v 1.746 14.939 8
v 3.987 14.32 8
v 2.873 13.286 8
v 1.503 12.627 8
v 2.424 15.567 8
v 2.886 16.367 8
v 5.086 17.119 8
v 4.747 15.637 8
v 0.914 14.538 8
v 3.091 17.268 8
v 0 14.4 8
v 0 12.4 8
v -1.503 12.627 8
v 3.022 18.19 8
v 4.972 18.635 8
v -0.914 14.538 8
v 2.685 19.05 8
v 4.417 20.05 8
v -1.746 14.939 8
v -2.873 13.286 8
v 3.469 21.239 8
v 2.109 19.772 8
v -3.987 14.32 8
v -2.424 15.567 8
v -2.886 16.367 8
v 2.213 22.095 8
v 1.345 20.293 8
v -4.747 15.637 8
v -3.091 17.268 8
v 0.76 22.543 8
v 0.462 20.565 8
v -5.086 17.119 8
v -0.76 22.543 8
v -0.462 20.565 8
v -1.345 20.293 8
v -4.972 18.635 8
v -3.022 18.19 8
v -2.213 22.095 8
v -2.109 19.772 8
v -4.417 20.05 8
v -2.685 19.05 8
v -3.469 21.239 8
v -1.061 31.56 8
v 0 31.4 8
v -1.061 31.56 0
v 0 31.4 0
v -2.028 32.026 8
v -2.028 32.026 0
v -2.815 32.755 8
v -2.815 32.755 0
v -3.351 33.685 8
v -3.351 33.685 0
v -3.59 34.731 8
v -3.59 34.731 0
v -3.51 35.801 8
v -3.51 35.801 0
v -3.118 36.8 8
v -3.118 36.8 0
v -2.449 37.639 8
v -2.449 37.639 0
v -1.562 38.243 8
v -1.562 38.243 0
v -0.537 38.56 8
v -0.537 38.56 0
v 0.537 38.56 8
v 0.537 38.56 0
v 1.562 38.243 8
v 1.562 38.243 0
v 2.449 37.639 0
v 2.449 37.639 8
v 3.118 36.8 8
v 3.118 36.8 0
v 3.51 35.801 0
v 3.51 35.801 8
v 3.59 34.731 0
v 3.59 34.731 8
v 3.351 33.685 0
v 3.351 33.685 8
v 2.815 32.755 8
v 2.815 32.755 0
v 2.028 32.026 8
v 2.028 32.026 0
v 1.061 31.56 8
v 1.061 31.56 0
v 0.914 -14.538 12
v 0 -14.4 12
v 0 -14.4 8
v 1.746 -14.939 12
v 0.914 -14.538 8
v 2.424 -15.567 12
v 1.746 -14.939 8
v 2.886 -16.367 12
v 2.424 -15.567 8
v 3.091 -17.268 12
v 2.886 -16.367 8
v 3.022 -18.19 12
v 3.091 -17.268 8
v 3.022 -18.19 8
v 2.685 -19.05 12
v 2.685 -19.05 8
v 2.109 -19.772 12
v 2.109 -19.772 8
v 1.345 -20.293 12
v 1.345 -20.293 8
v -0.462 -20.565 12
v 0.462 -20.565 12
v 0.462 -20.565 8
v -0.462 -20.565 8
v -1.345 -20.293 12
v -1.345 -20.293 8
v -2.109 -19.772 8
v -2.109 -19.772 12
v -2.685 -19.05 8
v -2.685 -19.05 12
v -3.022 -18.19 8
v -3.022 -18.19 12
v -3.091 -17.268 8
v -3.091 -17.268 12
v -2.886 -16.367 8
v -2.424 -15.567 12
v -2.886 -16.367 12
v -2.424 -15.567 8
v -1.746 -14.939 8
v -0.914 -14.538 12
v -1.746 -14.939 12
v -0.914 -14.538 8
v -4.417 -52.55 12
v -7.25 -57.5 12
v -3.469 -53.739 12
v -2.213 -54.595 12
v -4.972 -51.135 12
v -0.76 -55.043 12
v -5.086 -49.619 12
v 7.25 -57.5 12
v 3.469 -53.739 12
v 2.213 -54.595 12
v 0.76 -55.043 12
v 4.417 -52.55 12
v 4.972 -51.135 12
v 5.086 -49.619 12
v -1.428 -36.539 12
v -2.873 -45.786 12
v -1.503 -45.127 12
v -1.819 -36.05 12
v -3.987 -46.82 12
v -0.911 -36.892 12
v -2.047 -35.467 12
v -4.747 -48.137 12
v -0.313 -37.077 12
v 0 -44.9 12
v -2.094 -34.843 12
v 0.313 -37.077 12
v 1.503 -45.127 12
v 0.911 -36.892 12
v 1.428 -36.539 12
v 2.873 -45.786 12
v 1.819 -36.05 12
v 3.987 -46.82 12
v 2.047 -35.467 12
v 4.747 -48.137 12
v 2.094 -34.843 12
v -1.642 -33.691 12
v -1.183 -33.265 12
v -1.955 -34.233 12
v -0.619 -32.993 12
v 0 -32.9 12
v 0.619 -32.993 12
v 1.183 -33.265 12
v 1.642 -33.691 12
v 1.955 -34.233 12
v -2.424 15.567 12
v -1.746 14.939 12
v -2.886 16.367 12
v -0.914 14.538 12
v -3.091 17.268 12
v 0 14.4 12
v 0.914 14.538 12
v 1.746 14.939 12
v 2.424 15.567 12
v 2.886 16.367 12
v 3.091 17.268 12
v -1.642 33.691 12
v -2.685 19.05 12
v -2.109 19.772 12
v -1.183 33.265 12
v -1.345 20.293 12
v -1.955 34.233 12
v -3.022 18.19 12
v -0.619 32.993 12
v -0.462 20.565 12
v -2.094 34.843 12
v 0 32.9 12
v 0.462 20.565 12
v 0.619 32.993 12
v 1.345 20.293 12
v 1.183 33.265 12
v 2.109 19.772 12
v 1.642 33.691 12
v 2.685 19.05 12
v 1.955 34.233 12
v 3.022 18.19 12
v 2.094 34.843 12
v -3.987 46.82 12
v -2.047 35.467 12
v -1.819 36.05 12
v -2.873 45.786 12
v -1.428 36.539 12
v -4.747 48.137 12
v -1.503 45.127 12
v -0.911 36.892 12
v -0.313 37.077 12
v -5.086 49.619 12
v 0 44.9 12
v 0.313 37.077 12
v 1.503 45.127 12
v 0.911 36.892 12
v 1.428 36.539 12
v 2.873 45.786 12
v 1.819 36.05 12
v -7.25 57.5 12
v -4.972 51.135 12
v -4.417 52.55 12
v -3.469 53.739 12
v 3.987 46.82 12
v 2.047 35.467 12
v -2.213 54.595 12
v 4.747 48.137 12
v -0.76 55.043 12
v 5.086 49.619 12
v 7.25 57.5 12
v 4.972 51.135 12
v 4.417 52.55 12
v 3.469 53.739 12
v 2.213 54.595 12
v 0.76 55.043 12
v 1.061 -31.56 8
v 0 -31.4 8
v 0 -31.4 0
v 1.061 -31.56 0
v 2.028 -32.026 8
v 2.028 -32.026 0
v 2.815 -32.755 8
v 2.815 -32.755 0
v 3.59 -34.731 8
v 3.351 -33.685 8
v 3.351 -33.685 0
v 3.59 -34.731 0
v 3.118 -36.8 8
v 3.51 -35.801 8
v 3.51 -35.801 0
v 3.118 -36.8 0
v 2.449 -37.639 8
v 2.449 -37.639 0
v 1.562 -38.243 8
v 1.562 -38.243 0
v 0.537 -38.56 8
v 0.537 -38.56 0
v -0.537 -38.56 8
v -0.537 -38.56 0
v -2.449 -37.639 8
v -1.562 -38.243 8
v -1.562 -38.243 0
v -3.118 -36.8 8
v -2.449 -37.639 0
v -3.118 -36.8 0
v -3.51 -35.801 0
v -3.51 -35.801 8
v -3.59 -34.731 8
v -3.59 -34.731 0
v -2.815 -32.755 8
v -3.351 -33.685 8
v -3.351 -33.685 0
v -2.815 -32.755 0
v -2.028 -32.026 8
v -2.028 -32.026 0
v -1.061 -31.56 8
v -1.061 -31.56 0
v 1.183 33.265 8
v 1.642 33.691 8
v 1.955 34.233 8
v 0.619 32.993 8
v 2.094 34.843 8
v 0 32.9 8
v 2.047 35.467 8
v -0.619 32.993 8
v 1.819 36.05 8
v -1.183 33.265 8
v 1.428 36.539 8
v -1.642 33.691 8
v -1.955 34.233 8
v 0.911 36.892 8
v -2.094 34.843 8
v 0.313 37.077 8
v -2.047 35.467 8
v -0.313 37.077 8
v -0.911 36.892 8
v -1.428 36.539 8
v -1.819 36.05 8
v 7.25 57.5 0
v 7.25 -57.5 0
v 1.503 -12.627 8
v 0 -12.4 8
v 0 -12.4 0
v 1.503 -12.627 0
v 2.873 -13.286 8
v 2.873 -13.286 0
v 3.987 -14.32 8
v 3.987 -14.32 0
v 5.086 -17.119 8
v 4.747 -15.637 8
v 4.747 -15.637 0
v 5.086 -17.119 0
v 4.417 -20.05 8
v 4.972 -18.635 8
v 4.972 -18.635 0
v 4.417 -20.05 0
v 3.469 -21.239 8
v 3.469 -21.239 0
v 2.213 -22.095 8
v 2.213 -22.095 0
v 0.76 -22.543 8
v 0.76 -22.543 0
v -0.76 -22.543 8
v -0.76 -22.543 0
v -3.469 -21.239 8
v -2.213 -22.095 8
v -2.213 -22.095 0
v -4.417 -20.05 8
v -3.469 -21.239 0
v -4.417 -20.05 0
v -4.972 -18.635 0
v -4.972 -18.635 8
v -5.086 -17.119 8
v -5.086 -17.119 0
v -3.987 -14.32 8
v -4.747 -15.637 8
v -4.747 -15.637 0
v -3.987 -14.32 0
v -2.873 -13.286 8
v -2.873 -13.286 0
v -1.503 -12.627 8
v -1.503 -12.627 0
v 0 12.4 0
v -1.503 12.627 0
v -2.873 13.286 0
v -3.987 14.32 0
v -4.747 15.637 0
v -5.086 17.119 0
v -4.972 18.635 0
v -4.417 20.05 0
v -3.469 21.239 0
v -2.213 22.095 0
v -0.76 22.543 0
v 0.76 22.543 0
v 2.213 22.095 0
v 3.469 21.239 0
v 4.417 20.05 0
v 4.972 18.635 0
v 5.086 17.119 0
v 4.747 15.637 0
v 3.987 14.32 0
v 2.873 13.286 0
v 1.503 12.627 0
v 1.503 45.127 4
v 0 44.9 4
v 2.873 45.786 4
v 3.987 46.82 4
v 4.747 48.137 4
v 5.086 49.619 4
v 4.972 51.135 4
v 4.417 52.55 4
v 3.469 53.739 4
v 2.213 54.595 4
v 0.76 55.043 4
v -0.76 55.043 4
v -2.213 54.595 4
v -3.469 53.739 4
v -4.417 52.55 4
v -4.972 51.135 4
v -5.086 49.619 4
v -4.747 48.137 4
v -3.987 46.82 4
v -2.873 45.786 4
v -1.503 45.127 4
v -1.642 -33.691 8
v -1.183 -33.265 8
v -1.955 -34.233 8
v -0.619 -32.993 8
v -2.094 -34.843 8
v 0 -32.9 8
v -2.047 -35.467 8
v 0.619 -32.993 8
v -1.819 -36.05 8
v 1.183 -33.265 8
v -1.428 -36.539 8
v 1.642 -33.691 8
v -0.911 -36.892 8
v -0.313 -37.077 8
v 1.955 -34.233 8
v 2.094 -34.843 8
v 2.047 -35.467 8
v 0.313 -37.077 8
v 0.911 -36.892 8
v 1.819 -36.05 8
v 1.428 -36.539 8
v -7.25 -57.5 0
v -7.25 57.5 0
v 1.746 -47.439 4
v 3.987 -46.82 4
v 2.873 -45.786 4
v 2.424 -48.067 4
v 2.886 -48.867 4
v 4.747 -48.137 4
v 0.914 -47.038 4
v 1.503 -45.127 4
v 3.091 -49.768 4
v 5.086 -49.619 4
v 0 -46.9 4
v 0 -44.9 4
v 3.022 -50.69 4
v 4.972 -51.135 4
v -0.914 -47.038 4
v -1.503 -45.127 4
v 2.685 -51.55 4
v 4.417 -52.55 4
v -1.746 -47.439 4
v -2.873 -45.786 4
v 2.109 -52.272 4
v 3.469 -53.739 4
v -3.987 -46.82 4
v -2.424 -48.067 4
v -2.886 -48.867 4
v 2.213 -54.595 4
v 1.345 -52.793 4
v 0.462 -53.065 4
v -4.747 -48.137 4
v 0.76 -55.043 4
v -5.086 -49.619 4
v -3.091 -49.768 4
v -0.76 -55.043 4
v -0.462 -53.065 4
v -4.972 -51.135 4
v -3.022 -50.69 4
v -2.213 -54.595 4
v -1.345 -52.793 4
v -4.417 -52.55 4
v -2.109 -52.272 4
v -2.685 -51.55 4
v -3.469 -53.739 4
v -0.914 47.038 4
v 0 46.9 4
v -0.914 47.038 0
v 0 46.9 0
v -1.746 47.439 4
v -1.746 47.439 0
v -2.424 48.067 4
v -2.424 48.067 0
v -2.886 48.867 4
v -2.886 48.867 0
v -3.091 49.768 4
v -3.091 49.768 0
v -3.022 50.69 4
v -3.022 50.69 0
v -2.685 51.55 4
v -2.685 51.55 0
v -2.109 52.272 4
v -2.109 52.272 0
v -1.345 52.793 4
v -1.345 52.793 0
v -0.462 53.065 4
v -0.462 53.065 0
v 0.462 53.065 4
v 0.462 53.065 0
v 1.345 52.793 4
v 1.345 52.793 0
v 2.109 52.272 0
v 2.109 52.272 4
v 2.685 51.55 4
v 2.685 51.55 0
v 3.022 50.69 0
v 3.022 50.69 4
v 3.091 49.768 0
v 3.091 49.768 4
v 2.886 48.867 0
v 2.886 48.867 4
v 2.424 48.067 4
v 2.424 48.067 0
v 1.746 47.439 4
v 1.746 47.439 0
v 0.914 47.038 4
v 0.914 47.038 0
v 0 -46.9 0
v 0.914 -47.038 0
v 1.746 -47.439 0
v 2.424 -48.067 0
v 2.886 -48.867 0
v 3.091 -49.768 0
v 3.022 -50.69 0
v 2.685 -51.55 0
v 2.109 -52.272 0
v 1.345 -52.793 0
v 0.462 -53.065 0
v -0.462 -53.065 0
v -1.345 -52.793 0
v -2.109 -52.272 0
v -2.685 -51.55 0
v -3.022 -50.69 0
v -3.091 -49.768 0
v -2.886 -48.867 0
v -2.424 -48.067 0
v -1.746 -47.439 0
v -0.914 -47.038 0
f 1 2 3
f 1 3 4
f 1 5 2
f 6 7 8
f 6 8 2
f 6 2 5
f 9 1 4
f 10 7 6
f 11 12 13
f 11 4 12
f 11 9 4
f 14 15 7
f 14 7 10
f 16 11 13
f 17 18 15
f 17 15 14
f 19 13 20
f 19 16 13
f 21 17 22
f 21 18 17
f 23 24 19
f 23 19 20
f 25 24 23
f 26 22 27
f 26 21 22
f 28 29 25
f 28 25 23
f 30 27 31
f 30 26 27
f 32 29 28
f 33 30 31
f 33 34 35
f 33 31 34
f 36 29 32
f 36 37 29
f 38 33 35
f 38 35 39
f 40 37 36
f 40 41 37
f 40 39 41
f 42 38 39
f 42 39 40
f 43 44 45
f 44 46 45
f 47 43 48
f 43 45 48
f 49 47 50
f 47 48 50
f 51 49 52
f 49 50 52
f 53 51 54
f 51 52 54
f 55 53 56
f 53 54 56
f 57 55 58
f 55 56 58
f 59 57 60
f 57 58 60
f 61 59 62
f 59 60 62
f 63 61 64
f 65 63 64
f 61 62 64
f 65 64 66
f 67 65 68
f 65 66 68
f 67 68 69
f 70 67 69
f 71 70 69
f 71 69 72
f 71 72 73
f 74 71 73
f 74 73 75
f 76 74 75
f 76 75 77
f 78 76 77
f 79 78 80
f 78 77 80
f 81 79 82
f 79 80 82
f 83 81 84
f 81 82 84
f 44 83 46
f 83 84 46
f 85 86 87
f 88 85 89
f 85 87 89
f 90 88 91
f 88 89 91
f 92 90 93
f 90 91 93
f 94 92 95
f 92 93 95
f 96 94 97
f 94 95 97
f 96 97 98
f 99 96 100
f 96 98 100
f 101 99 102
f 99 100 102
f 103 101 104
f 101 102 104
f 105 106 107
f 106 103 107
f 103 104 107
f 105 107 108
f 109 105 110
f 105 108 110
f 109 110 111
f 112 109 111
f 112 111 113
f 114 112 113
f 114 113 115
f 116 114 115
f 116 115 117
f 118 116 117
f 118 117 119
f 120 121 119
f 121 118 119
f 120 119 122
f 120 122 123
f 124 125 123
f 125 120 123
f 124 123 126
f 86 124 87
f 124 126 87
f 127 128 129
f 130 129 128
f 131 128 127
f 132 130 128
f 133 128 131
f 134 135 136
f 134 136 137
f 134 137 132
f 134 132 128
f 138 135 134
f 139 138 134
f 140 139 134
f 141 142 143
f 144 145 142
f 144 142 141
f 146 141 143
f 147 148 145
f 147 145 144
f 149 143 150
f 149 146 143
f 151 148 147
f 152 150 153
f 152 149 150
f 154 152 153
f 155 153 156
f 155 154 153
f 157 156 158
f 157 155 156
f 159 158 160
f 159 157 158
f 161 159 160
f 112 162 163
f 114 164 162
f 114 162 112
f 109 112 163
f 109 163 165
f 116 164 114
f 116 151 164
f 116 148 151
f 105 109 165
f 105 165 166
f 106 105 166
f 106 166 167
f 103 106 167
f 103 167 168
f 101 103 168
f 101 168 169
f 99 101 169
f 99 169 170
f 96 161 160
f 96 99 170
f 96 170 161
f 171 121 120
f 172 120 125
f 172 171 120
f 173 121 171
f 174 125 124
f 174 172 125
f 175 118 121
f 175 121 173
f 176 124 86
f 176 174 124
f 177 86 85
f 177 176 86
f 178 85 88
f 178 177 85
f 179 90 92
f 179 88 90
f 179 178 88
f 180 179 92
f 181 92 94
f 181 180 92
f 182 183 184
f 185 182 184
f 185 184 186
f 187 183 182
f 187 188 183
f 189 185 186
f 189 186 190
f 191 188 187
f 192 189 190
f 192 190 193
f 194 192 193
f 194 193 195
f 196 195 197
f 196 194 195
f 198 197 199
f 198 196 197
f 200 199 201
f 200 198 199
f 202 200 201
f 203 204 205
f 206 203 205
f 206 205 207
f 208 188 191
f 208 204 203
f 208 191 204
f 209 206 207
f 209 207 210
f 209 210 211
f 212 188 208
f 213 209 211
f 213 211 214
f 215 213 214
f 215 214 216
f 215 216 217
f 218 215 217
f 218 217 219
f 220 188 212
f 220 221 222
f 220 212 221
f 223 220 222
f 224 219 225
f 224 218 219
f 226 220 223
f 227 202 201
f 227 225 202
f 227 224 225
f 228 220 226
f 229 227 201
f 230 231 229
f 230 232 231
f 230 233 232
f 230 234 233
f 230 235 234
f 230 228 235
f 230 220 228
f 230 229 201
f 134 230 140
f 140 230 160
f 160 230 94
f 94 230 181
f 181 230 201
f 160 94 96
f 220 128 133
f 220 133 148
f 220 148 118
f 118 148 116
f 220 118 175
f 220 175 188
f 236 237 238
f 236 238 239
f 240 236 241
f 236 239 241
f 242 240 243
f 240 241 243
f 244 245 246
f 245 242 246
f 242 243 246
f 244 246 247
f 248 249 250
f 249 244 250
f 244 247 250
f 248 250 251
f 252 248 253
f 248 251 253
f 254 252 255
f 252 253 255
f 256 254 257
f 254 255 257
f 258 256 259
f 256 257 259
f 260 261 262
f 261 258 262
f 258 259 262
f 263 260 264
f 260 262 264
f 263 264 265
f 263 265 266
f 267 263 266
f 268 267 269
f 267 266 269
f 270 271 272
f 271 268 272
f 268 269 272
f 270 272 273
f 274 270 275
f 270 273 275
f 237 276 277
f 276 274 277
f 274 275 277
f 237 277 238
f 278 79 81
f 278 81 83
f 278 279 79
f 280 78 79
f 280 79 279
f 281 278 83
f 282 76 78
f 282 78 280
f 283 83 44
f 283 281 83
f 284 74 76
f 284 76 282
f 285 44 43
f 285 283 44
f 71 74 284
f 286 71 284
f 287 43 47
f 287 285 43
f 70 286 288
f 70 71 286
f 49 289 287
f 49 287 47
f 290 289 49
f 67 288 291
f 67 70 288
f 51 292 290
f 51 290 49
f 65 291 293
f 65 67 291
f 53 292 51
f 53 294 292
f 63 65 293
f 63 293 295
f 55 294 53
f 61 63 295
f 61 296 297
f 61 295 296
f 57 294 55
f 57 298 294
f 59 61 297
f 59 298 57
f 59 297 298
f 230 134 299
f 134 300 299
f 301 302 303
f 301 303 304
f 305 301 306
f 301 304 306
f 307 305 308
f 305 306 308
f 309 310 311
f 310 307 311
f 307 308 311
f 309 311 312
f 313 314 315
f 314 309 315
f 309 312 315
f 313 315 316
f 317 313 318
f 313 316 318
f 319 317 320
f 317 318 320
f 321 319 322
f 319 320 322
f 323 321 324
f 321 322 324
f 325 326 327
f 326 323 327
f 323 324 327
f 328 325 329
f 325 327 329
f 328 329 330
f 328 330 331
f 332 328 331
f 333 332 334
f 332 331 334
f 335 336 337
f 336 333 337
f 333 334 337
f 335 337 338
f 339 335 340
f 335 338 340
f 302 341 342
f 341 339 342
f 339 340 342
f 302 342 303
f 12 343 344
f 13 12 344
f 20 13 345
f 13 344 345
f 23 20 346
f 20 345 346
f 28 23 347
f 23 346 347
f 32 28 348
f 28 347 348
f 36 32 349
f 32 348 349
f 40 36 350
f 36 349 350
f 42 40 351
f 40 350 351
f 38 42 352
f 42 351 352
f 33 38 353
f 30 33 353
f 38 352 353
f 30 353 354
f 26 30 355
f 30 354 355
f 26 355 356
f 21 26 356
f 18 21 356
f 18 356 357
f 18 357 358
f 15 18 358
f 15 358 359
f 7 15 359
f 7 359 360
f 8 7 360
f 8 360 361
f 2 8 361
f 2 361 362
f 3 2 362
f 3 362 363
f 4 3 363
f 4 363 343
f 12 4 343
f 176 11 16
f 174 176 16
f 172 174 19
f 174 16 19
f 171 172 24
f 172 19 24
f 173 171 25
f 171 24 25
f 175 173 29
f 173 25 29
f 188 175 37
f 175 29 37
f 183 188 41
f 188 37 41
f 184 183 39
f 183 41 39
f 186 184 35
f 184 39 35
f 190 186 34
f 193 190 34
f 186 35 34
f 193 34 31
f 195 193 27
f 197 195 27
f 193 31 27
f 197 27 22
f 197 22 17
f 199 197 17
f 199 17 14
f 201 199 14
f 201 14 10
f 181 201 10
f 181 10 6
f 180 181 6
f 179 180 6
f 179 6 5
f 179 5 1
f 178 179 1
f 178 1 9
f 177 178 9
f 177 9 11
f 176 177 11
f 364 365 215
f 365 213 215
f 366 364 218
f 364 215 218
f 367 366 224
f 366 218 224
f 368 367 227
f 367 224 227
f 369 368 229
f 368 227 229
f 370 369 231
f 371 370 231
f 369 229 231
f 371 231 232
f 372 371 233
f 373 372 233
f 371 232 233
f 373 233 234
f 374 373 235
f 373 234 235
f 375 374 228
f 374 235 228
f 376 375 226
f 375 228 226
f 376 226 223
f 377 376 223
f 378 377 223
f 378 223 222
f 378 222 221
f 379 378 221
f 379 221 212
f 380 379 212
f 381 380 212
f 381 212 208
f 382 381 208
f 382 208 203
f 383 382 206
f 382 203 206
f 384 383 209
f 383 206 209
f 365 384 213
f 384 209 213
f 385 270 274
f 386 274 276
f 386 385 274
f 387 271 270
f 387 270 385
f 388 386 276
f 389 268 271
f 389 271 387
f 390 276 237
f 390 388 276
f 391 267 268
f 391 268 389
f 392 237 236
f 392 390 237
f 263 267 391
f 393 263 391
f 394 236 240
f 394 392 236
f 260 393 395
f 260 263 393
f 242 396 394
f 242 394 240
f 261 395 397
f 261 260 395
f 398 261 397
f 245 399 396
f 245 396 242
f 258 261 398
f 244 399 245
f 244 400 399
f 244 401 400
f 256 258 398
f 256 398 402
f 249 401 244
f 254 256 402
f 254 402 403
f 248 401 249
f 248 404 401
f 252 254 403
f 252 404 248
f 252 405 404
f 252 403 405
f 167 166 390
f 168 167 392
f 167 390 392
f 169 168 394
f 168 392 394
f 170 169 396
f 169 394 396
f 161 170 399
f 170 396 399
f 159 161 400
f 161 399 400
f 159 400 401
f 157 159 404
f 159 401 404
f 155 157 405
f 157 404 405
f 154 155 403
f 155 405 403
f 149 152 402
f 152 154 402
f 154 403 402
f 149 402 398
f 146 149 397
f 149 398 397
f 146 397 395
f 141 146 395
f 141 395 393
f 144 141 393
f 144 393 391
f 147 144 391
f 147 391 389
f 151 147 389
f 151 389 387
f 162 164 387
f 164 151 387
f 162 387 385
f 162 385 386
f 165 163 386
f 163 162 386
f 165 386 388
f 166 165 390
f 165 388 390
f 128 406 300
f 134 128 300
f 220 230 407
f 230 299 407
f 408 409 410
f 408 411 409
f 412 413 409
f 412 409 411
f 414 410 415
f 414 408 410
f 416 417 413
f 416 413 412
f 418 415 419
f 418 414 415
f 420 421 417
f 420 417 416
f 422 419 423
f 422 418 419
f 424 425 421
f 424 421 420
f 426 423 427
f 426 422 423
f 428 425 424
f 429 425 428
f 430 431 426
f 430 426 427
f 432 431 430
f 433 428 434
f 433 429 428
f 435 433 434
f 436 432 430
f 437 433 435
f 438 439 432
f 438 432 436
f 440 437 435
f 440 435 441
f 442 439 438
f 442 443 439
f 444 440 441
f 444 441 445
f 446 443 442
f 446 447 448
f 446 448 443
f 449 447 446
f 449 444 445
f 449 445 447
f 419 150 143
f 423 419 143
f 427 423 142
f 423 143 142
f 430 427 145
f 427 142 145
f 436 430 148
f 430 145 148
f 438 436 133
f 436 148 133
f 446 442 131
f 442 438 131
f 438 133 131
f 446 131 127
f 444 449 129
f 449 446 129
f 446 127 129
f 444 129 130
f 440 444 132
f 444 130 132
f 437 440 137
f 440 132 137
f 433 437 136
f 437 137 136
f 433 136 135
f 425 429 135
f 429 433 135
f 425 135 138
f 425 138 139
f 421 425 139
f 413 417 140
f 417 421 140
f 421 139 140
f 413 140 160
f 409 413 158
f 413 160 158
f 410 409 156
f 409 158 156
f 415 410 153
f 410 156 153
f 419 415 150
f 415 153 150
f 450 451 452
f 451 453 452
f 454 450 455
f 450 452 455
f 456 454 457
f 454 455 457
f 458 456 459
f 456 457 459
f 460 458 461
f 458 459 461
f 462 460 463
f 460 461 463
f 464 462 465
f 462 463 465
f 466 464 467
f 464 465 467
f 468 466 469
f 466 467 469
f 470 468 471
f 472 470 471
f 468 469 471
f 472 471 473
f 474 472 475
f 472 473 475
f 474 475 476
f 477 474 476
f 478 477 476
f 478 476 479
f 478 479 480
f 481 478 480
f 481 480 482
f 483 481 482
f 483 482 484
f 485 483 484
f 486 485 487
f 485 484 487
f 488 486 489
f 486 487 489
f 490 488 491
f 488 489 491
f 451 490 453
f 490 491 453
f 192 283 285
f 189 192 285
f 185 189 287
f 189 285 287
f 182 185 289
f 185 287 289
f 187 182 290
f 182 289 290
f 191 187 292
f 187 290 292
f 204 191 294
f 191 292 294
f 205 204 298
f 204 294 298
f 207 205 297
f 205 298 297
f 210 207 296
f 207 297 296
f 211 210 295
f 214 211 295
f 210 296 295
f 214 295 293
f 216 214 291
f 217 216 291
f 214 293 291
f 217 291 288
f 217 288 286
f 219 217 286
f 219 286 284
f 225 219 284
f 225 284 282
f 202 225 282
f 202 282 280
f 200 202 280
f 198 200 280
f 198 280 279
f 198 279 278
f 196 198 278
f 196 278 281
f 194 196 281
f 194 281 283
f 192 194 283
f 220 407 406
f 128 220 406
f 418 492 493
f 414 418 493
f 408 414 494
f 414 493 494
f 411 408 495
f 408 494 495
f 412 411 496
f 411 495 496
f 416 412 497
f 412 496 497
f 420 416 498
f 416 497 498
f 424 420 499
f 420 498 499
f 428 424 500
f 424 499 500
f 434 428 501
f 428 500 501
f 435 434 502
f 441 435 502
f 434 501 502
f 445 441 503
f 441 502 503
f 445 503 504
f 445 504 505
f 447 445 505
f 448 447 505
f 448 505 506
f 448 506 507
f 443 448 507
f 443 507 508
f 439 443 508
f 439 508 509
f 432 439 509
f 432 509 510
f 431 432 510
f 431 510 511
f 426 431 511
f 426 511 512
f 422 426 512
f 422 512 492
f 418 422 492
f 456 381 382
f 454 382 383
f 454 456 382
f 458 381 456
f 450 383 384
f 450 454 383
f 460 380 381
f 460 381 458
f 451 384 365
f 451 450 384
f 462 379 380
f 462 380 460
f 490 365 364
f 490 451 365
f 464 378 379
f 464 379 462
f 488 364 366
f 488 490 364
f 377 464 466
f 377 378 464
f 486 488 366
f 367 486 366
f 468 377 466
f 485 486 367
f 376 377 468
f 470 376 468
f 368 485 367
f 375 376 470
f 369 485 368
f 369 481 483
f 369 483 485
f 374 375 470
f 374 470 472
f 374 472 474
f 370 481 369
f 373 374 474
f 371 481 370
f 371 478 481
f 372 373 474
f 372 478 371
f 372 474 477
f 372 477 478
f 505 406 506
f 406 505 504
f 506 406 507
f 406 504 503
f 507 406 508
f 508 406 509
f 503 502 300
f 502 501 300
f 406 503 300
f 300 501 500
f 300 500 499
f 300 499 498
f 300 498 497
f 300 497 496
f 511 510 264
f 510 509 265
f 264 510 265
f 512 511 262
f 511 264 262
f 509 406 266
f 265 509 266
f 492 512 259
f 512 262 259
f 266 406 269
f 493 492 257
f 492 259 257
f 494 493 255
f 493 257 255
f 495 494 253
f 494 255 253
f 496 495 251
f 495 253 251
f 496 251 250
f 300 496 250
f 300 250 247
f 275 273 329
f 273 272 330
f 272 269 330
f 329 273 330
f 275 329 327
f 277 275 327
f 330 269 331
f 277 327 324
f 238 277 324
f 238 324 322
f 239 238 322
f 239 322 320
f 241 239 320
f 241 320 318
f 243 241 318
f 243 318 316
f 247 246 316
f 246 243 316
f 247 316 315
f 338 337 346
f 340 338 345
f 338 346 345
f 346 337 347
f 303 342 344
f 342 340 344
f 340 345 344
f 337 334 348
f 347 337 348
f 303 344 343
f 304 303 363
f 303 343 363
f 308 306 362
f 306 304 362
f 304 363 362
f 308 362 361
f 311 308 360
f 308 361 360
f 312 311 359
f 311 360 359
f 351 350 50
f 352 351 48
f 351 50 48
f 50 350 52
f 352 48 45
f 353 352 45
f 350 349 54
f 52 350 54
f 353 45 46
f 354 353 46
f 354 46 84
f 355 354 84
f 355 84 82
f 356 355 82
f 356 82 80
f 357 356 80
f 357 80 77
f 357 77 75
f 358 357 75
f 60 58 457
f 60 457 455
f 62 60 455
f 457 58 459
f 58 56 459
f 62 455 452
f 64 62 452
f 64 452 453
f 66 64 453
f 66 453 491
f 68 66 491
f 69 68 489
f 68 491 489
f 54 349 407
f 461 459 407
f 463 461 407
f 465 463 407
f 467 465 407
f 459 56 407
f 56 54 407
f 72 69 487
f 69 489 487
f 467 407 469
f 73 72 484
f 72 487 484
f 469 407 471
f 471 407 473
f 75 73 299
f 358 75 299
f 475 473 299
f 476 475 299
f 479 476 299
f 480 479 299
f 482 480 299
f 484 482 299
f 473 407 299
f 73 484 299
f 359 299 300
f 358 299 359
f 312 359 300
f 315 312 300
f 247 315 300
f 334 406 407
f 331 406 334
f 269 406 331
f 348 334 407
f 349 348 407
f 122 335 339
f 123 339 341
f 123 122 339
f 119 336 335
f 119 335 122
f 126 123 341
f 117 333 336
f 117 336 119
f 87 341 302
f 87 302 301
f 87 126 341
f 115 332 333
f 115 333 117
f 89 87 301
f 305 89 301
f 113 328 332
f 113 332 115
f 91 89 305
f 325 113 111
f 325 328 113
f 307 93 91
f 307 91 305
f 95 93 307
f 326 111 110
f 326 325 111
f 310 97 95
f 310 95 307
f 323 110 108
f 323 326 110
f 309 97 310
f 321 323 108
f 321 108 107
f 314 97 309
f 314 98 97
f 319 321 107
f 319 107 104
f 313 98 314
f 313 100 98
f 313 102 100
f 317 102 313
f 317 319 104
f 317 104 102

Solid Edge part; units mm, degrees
sketch "Sketch1" plane through (0, 0, 0) normal (0, 0, 1) x (1, 0, 0)
  line L0 (-7.25, -57.5) -> (7.25, -57.5)
  line L1 (7.25, -57.5) -> (7.25, 57.5)
  line L2 (7.25, 57.5) -> (-7.25, 57.5)
  line L3 (-7.25, 57.5) -> (-7.25, -57.5)
  dimension "D1" = 14.5
  dimension "D2" = 115
extrude "Protrusion1" add sketch "Sketch1" along normal blind 12
sketch "Sketch2" plane through (0, 0, 0) normal (0, 0, -1) x (0, -1, 0)
  circle A0 centre (-35, 0) radius 2.1
  circle A1 centre (-50, 0) radius 3.1
  circle A2 centre (-17.5, 0) radius 3.1
  dimension "D1" = 17.5
  dimension "D2" = 35
  dimension "D3" = 50
extrude "Cutout1" cut sketch "Sketch2" against normal up to next
sketch "Sketch3" plane through (0, 0, 0) normal (0, 0, -1) x (0, -1, 0)
  circle A0 centre (-17.5, 0) radius 5.1
  circle A1 centre (-35, 0) radius 3.6
extrude "ExtrudedCutout_2" cut sketch "Sketch3" against normal blind 8
sketch "Sketch4" plane through (0, 0, 12) normal (0, 0, 1) x (0, -1, 0)
  circle A0 centre (-50, 0) radius 5.1
extrude "ExtrudedCutout_3" cut sketch "Sketch4" against normal blind 8
mirror "Mirror1" about plane through (0, 0, 0) normal (0, 1, 0) of "Cutout1", "ExtrudedCutout_2", "ExtrudedCutout_3"
